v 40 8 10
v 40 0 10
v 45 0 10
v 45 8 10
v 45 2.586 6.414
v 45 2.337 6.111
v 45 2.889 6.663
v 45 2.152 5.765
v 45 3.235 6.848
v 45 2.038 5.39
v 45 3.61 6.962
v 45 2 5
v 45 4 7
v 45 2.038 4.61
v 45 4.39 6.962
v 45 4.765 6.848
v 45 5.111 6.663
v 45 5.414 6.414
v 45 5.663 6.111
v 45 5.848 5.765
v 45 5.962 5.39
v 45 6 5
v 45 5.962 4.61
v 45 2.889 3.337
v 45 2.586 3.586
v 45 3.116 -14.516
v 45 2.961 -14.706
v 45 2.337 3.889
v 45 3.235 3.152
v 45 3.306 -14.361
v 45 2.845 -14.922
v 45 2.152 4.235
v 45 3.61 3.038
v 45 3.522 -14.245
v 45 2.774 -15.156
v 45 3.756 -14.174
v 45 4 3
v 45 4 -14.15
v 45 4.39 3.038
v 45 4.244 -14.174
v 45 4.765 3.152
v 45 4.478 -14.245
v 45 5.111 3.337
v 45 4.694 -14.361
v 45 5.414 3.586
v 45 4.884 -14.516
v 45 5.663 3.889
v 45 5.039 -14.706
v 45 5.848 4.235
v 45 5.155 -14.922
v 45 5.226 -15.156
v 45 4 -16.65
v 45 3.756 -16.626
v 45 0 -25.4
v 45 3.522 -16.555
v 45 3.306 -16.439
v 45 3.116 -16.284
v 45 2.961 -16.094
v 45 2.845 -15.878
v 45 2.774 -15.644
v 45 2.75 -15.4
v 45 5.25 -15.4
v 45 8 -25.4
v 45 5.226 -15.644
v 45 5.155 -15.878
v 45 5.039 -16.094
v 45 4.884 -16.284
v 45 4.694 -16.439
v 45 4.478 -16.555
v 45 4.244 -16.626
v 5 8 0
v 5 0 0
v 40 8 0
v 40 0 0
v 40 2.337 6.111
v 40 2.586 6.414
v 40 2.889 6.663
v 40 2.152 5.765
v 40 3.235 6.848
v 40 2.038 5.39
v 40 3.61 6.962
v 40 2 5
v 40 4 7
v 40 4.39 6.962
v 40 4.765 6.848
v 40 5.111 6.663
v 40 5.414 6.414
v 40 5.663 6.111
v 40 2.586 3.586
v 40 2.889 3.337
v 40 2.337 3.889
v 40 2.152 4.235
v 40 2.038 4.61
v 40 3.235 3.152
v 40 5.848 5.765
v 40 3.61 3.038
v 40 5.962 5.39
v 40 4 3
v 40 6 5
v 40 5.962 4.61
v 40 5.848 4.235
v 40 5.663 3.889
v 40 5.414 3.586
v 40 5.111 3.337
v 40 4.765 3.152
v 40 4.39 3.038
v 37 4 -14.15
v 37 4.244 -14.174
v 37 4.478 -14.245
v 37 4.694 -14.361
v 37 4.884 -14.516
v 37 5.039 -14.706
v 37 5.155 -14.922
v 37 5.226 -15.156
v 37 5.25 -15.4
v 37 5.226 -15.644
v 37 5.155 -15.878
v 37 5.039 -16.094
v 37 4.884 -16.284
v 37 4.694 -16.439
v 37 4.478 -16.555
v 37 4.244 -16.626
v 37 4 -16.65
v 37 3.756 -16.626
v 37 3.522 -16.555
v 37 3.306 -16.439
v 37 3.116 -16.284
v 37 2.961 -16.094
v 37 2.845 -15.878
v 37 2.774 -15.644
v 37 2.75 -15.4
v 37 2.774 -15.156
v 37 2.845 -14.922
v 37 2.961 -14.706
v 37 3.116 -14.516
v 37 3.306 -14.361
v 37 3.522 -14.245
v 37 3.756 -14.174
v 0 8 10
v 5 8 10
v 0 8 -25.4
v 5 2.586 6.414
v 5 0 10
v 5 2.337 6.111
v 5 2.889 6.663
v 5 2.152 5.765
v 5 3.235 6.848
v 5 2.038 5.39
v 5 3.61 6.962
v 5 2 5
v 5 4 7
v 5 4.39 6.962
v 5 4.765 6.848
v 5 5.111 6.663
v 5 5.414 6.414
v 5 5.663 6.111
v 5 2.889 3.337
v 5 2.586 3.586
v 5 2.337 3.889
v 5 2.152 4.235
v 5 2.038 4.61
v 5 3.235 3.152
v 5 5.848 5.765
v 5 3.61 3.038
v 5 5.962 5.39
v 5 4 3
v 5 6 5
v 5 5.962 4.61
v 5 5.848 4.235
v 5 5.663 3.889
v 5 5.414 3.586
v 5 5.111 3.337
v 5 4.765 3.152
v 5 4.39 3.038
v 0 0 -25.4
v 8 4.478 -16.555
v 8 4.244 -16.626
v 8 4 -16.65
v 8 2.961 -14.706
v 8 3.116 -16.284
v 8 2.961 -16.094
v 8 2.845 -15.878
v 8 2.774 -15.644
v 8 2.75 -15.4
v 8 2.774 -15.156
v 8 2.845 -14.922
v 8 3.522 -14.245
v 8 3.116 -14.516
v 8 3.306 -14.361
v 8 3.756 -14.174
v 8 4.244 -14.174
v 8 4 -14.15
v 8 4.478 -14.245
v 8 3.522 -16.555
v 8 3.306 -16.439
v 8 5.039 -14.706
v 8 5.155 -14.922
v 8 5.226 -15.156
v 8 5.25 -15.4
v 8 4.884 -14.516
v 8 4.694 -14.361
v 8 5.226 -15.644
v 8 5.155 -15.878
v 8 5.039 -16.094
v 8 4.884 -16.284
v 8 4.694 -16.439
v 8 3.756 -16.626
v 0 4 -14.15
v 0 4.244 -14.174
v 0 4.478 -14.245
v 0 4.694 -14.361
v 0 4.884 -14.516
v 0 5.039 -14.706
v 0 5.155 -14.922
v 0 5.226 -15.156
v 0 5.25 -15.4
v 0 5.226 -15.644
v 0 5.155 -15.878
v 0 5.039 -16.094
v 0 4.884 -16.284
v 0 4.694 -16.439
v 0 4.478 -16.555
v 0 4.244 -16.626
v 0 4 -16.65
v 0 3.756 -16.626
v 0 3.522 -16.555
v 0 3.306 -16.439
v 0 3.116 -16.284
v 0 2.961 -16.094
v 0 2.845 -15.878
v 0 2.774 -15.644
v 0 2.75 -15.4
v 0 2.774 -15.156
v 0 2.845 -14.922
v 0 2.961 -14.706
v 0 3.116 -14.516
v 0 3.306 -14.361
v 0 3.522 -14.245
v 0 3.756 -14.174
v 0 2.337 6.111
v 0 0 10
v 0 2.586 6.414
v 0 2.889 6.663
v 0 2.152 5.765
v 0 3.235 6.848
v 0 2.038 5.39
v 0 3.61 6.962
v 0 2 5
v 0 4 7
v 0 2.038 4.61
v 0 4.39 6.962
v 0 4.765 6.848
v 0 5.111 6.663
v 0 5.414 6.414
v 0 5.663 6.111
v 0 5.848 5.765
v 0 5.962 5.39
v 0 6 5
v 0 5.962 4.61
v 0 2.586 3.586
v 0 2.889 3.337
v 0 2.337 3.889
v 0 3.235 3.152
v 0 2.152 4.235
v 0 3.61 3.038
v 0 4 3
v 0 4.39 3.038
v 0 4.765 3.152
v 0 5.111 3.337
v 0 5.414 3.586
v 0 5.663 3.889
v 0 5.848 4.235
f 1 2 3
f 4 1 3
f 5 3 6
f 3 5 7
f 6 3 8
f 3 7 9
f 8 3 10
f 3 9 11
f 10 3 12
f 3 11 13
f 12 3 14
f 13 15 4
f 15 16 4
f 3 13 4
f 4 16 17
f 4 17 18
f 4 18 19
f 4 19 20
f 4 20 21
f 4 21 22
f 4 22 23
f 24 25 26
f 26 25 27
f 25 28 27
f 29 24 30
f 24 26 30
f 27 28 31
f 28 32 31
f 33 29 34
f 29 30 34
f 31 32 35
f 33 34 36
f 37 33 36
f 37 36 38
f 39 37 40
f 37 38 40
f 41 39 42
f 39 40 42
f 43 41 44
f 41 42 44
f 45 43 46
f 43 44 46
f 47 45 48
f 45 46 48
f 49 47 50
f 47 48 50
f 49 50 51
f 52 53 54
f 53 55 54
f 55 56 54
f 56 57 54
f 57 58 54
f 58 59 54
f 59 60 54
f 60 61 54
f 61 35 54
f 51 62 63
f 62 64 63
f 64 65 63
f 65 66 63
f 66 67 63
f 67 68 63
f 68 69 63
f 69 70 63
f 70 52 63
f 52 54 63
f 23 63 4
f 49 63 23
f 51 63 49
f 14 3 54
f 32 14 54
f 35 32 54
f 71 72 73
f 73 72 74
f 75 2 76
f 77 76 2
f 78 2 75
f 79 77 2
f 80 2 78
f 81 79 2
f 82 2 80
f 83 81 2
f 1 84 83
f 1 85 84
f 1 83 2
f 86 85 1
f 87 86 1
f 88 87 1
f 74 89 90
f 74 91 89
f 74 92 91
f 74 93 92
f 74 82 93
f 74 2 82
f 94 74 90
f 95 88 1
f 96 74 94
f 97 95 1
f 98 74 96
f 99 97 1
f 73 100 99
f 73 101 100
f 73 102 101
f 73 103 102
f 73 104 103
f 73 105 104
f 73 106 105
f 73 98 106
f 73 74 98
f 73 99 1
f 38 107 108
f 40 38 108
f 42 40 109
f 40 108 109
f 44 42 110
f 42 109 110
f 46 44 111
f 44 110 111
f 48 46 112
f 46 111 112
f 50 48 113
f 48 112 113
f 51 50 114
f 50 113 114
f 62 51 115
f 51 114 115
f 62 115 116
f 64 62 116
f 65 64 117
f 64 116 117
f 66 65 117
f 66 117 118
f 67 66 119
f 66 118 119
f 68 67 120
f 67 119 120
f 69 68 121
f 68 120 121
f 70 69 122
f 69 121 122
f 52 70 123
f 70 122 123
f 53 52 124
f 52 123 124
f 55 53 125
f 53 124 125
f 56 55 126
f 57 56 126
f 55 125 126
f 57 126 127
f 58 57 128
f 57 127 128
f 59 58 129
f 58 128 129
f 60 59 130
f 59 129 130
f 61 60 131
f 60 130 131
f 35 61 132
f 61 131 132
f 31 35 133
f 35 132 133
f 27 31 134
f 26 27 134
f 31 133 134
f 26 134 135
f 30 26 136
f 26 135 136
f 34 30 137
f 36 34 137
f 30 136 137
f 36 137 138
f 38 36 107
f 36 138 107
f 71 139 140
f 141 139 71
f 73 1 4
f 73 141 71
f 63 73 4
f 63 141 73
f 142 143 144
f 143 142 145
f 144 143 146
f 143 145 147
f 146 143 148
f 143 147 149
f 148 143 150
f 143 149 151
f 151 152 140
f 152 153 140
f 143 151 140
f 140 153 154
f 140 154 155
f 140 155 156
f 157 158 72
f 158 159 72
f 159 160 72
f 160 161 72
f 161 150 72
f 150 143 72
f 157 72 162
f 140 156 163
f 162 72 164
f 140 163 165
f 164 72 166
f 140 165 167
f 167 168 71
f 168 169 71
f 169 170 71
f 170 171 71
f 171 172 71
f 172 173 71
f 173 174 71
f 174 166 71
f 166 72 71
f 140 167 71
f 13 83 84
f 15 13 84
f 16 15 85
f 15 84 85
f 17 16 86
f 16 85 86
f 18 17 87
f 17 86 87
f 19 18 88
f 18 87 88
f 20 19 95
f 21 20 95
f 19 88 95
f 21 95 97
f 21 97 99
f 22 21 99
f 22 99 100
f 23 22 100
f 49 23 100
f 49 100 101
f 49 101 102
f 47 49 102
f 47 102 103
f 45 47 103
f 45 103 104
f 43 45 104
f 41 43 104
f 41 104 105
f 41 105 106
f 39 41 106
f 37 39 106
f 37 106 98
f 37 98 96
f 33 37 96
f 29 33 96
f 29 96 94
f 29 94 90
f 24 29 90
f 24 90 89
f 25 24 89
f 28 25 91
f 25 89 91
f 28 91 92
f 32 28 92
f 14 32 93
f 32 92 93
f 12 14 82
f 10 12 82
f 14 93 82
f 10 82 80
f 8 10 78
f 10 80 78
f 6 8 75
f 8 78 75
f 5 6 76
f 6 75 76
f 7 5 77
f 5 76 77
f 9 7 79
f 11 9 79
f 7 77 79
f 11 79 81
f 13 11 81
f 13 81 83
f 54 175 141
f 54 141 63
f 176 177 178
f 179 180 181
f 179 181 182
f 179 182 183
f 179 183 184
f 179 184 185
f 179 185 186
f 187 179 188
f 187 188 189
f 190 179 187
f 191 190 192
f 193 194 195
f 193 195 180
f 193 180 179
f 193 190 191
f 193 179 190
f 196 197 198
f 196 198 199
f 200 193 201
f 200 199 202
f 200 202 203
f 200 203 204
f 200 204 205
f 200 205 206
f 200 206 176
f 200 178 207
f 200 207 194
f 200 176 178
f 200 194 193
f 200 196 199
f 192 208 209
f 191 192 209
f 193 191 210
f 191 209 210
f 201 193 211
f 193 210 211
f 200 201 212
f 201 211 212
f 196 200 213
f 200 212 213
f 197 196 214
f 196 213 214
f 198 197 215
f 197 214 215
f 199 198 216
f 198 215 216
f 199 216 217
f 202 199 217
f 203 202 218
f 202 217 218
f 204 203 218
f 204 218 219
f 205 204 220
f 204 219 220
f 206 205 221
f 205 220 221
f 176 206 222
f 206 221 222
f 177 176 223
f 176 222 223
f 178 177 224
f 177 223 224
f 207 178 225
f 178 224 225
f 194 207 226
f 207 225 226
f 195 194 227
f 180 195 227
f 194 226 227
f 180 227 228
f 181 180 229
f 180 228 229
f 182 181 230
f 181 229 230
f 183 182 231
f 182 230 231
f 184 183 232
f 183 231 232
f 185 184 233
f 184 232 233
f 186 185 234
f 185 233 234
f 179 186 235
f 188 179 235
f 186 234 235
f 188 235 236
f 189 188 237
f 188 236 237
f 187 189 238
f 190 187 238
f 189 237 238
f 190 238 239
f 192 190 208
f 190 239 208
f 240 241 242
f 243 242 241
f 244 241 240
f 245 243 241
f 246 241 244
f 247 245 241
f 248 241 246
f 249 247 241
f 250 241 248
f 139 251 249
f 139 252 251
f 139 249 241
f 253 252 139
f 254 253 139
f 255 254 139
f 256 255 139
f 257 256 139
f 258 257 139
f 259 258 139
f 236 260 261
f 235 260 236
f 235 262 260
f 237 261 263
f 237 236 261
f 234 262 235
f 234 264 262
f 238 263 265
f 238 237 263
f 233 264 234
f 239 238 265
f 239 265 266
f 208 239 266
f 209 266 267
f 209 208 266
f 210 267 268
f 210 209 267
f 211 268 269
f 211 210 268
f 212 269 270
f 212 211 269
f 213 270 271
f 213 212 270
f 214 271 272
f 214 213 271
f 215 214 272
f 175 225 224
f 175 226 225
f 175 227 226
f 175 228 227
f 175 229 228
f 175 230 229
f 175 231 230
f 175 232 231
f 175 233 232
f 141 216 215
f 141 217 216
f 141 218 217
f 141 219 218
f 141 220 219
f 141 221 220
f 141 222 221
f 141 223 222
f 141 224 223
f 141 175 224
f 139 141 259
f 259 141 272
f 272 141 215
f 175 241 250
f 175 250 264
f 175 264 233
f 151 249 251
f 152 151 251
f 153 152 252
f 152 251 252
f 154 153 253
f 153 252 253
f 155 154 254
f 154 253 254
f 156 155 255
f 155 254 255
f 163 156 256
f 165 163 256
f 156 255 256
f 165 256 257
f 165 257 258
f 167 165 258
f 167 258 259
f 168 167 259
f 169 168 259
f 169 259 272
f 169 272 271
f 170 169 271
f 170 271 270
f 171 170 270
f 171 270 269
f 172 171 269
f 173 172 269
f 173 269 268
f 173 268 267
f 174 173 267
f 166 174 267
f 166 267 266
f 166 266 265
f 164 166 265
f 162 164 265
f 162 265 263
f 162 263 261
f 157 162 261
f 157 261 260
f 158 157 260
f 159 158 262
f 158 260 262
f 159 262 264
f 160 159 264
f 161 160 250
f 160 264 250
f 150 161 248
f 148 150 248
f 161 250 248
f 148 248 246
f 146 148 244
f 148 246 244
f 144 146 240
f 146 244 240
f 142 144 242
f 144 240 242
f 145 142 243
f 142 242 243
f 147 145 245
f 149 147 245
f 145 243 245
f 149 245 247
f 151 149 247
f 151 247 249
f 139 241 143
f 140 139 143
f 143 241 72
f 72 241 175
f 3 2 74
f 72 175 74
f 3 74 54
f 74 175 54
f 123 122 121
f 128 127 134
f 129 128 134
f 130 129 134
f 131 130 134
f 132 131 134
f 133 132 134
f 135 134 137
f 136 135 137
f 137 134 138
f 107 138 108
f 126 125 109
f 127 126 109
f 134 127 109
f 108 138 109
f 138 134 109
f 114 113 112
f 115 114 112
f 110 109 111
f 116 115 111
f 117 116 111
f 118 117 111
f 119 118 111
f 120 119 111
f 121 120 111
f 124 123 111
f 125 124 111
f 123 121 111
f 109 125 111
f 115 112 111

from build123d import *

# Parameters (mm, degrees)
SKETCH1_W           = 45
SKETCH1_H           = 25.4
BOSS_EXTRUDE1_DEPTH = 8
SKETCH2_W           = 5
SKETCH2_H           = 8
BOSS_EXTRUDE2_DEPTH = 10
SKETCH3_R           = 2
CUT_EXTRUDE1_DEPTH  = 30
LPATTERN1_COUNT     = 2
LPATTERN1_PITCH     = 40
SKETCH4_R           = 1.25
CUT_EXTRUDE2_DEPTH  = 8
LPATTERN2_COUNT     = 2
LPATTERN2_PITCH     = 37


with BuildPart() as part:
    # Sketch1 → Boss-Extrude1 (new body)
    with BuildSketch(Plane(origin=(0, 0, 0), x_dir=(1, 0, 0), z_dir=(0, 1, 0))):
        with Locations((22.5, 12.7)):
            Rectangle(SKETCH1_W, SKETCH1_H)
    extrude(amount=BOSS_EXTRUDE1_DEPTH)

    # Sketch2 → Boss-Extrude2 (add)
    with BuildSketch(Plane.XY):
        with Locations((42.5, 4)):
            Rectangle(SKETCH2_W, SKETCH2_H)
    boss_extrude2 = extrude(amount=BOSS_EXTRUDE2_DEPTH)

    # Sketch3 → Cut-Extrude1 (cut)
    with BuildSketch(Plane.ZY.offset(-40)):
        with Locations((5, 4)):
            Circle(SKETCH3_R)
    cut_extrude1 = extrude(amount=-CUT_EXTRUDE1_DEPTH, mode=Mode.SUBTRACT)

    # LPattern1: Boss-Extrude2, Cut-Extrude1 ×2
    with Locations(*[(-i * LPATTERN1_PITCH, 0, 0) for i in range(1, LPATTERN1_COUNT)]):
        add(boss_extrude2)
        add(cut_extrude1, mode=Mode.SUBTRACT)

    # Sketch4 → Cut-Extrude2 (cut)
    with BuildSketch(Plane.ZY):
        with Locations((-15.4, 4)):
            Circle(SKETCH4_R)
    cut_extrude2 = extrude(amount=-CUT_EXTRUDE2_DEPTH, mode=Mode.SUBTRACT)

    # LPattern2: Cut-Extrude2 ×2
    with Locations(*[(i * LPATTERN2_PITCH, 0, 0) for i in range(1, LPATTERN2_COUNT)]):
        add(cut_extrude2, mode=Mode.SUBTRACT)


solid = part.part
